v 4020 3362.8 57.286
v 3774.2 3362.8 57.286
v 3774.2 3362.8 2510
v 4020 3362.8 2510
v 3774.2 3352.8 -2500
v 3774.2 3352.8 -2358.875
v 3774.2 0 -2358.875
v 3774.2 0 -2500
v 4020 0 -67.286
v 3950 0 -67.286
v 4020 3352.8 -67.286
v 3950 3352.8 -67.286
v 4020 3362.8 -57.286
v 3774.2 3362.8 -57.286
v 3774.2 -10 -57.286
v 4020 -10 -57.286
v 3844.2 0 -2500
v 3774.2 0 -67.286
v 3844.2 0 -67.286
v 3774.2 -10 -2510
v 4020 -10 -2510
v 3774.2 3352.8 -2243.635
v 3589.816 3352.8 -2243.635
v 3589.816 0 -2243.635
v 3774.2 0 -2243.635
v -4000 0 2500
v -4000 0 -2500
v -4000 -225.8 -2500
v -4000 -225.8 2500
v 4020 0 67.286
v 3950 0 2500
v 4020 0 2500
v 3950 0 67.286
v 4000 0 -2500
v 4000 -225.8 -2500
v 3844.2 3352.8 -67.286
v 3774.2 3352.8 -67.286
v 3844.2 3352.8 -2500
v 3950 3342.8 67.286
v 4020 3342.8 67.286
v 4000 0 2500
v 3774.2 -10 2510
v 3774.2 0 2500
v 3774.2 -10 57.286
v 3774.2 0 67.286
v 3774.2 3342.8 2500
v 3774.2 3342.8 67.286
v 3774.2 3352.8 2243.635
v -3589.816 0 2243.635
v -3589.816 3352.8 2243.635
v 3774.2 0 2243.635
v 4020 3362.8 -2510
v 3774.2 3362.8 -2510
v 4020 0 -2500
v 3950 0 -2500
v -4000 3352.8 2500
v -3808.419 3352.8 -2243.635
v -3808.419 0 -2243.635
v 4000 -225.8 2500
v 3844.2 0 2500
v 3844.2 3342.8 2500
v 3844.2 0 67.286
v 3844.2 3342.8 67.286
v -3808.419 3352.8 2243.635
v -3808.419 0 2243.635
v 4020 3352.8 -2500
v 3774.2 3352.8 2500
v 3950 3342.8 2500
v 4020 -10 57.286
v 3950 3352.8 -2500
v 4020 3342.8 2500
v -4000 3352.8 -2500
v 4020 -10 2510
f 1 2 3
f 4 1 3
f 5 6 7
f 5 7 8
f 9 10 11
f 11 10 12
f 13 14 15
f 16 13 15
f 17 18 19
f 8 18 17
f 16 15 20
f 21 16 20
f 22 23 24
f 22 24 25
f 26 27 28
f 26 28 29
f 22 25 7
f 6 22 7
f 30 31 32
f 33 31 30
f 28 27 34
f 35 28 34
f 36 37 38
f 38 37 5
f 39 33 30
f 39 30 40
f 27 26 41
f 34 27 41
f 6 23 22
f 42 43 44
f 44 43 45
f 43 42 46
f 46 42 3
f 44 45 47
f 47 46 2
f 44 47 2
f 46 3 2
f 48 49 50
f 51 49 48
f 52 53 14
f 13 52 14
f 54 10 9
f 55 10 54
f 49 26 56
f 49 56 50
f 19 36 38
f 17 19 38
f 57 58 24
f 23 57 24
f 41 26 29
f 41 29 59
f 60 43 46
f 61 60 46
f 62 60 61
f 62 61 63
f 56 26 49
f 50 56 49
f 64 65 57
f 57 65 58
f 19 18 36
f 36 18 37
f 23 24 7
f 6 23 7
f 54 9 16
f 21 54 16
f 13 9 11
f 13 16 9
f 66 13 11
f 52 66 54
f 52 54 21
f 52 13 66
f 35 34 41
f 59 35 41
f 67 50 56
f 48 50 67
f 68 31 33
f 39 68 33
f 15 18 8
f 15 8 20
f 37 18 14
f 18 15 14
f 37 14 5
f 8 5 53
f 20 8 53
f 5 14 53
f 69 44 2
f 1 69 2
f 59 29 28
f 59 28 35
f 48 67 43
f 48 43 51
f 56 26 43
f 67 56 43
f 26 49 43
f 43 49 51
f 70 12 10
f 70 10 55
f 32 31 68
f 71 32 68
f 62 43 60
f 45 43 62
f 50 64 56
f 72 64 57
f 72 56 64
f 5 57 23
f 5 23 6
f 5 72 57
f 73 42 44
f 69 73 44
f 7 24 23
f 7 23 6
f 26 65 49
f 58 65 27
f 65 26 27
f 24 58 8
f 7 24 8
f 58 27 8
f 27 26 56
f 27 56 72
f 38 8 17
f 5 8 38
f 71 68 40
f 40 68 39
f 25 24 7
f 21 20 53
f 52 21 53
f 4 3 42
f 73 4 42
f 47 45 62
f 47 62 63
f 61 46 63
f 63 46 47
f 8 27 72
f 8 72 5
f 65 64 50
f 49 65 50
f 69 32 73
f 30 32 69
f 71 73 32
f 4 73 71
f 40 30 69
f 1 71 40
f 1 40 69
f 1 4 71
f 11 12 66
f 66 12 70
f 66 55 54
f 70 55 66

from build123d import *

# Parameters (mm, degrees)
SKETCH1_W                 = 8000
SKETCH1_H                 = 5000
SKETCH1_W_2               = 7616.83718919
SKETCH1_H_2               = 4487.2704
BOSS_EXTRUDE1_DEPTH       = 3352.8
SPLIT1_SURFACE_1_BACK     = 10013.056
SPLIT1_SURFACE_1_DEPTH    = 20026.112
SPLIT1_SURFACE_2_BACK     = 10013.056
SPLIT1_SURFACE_2_DEPTH    = 20026.112
SKETCH3_W                 = 8000
SKETCH3_H                 = 5000
BOSS_EXTRUDE2_DEPTH       = 225.8
SKETCH4_W                 = 5000
SKETCH4_H                 = 3352.8
CUT_EXTRUDE1_DEPTH        = 225.8
EXTRUDE_THIN4_OUTLINE_W   = 2432.713905463
EXTRUDE_THIN4_OUTLINE_H   = 3342.8
EXTRUDE_THIN4_OUTLINE_H_2 = 3352.8
EXTRUDE_THIN4_DEPTH       = 245.8
SKETCH6_W                 = 2432.713905463
SKETCH6_H                 = 3342.8
SKETCH6_H_2               = 3352.8
BOSS_EXTRUDE3_DEPTH       = 52.9


# Read off the part's stored shape, not the designer's step: Extrude-Thin4
with BuildPart() as part:
    # Sketch1 → Boss-Extrude1 (new body)
    with BuildSketch(Plane(origin=(0, 0, 0), x_dir=(1, 0, 0), z_dir=(0, 1, 0))):
        Rectangle(SKETCH1_W, SKETCH1_H)
        Rectangle(SKETCH1_W_2, SKETCH1_H_2, mode=Mode.SUBTRACT)
    extrude(amount=BOSS_EXTRUDE1_DEPTH)


with BuildPart() as body_2:
    # Split1: the piece behind the surface
    add(part.part)
    # Split1 surface: a surface, the sketch's curves swept straight by 20026.112 mm
    with BuildLine(Plane(origin=(0, 3352.8, 0), x_dir=(1, 0, 0), z_dir=(0, 1, 0)).offset(-SPLIT1_SURFACE_1_BACK), mode=Mode.PRIVATE) as split1_surface_1_path:
        Line((-4000, -2500), (4000, 2500))
    split1_surface_1 = Shell.extrude(split1_surface_1_path.wire(), (0 * SPLIT1_SURFACE_1_DEPTH, 1 * SPLIT1_SURFACE_1_DEPTH, 0 * SPLIT1_SURFACE_1_DEPTH))
    split(bisect_by=split1_surface_1, keep=Keep.BOTTOM)


with BuildPart() as part_1:
    add(part.part)

    # Split1: split by a surface, the side it looks to stays
    # Split1 surface: a surface, the sketch's curves swept straight by 20026.112 mm
    with BuildLine(Plane(origin=(0, 3352.8, 0), x_dir=(1, 0, 0), z_dir=(0, 1, 0)).offset(-SPLIT1_SURFACE_2_BACK), mode=Mode.PRIVATE) as split1_surface_2_path:
        Line((-4000, -2500), (4000, 2500))
    split1_surface_2 = Shell.extrude(split1_surface_2_path.wire(), (0 * SPLIT1_SURFACE_2_DEPTH, 1 * SPLIT1_SURFACE_2_DEPTH, 0 * SPLIT1_SURFACE_2_DEPTH))
    split(bisect_by=split1_surface_2, keep=Keep.TOP)


with BuildPart() as body_3:
    # Sketch3 → Boss-Extrude2 (new body)
    with BuildSketch(Plane.XZ):
        Rectangle(SKETCH3_W, SKETCH3_H)
    extrude(amount=BOSS_EXTRUDE2_DEPTH)


with BuildPart() as cut_extrude1_tool:
    # Sketch4 → Cut-Extrude1 (new body)
    with BuildSketch(Plane(origin=(4000, 0, 0), x_dir=(0, 0, -1), z_dir=(1, 0, 0))):
        with Locations((0, 1676.4)):
            Rectangle(SKETCH4_W, SKETCH4_H)
    extrude(amount=-CUT_EXTRUDE1_DEPTH)


with BuildPart() as part_2:
    add(part_1.part)

    # Cut-Extrude1: cut by cut_extrude1_tool
    add(cut_extrude1_tool.part, mode=Mode.SUBTRACT)


with BuildPart() as body_2_1:
    add(body_2.part)

    # Cut-Extrude1: cut by cut_extrude1_tool
    add(cut_extrude1_tool.part, mode=Mode.SUBTRACT)


with BuildPart() as body_4:
    # Extrude-Thin4 outline → Extrude-Thin4 (new body)
    # profile 1 of 2: a face of its own
    with BuildSketch(Plane(origin=(3774.2, 0, 0), x_dir=(0, 0, -1), z_dir=(1, 0, 0))):
        Polygon((-57.286094537, -10), (-57.286094537, 0), (-57.286094537, 3362.8), (-2510, 3362.8), (-2510, -10), align=None)
        with Locations((-1283.643047268, 1671.4)):
            Rectangle(EXTRUDE_THIN4_OUTLINE_W, EXTRUDE_THIN4_OUTLINE_H, mode=Mode.SUBTRACT)
    # profile 2 of 2: a face of its own
    with BuildSketch(Plane(origin=(3774.2, 0, 0), x_dir=(0, 0, -1), z_dir=(1, 0, 0))):
        Polygon((57.286094537, 3362.8), (57.286094537, 0), (57.286094537, -10), (2510, -10), (2510, 3362.8), align=None)
        with Locations((1283.643047268, 1676.4)):
            Rectangle(EXTRUDE_THIN4_OUTLINE_W, EXTRUDE_THIN4_OUTLINE_H_2, mode=Mode.SUBTRACT)
    extrude(amount=EXTRUDE_THIN4_DEPTH)

    # Sketch6 → Boss-Extrude3 (add, symmetric)
    with BuildSketch(Plane(origin=(3897.1, 0, 0), x_dir=(0, 0, -1), z_dir=(1, 0, 0))):
        with Locations((-1283.643047268, 1671.4)):
            Rectangle(SKETCH6_W, SKETCH6_H)
        with Locations((1283.643047268, 1676.4)):
            Rectangle(SKETCH6_W, SKETCH6_H_2)
    extrude(amount=BOSS_EXTRUDE3_DEPTH, both=True)


solid = Compound([body_3.part, part_2.part, body_2_1.part, body_4.part])
